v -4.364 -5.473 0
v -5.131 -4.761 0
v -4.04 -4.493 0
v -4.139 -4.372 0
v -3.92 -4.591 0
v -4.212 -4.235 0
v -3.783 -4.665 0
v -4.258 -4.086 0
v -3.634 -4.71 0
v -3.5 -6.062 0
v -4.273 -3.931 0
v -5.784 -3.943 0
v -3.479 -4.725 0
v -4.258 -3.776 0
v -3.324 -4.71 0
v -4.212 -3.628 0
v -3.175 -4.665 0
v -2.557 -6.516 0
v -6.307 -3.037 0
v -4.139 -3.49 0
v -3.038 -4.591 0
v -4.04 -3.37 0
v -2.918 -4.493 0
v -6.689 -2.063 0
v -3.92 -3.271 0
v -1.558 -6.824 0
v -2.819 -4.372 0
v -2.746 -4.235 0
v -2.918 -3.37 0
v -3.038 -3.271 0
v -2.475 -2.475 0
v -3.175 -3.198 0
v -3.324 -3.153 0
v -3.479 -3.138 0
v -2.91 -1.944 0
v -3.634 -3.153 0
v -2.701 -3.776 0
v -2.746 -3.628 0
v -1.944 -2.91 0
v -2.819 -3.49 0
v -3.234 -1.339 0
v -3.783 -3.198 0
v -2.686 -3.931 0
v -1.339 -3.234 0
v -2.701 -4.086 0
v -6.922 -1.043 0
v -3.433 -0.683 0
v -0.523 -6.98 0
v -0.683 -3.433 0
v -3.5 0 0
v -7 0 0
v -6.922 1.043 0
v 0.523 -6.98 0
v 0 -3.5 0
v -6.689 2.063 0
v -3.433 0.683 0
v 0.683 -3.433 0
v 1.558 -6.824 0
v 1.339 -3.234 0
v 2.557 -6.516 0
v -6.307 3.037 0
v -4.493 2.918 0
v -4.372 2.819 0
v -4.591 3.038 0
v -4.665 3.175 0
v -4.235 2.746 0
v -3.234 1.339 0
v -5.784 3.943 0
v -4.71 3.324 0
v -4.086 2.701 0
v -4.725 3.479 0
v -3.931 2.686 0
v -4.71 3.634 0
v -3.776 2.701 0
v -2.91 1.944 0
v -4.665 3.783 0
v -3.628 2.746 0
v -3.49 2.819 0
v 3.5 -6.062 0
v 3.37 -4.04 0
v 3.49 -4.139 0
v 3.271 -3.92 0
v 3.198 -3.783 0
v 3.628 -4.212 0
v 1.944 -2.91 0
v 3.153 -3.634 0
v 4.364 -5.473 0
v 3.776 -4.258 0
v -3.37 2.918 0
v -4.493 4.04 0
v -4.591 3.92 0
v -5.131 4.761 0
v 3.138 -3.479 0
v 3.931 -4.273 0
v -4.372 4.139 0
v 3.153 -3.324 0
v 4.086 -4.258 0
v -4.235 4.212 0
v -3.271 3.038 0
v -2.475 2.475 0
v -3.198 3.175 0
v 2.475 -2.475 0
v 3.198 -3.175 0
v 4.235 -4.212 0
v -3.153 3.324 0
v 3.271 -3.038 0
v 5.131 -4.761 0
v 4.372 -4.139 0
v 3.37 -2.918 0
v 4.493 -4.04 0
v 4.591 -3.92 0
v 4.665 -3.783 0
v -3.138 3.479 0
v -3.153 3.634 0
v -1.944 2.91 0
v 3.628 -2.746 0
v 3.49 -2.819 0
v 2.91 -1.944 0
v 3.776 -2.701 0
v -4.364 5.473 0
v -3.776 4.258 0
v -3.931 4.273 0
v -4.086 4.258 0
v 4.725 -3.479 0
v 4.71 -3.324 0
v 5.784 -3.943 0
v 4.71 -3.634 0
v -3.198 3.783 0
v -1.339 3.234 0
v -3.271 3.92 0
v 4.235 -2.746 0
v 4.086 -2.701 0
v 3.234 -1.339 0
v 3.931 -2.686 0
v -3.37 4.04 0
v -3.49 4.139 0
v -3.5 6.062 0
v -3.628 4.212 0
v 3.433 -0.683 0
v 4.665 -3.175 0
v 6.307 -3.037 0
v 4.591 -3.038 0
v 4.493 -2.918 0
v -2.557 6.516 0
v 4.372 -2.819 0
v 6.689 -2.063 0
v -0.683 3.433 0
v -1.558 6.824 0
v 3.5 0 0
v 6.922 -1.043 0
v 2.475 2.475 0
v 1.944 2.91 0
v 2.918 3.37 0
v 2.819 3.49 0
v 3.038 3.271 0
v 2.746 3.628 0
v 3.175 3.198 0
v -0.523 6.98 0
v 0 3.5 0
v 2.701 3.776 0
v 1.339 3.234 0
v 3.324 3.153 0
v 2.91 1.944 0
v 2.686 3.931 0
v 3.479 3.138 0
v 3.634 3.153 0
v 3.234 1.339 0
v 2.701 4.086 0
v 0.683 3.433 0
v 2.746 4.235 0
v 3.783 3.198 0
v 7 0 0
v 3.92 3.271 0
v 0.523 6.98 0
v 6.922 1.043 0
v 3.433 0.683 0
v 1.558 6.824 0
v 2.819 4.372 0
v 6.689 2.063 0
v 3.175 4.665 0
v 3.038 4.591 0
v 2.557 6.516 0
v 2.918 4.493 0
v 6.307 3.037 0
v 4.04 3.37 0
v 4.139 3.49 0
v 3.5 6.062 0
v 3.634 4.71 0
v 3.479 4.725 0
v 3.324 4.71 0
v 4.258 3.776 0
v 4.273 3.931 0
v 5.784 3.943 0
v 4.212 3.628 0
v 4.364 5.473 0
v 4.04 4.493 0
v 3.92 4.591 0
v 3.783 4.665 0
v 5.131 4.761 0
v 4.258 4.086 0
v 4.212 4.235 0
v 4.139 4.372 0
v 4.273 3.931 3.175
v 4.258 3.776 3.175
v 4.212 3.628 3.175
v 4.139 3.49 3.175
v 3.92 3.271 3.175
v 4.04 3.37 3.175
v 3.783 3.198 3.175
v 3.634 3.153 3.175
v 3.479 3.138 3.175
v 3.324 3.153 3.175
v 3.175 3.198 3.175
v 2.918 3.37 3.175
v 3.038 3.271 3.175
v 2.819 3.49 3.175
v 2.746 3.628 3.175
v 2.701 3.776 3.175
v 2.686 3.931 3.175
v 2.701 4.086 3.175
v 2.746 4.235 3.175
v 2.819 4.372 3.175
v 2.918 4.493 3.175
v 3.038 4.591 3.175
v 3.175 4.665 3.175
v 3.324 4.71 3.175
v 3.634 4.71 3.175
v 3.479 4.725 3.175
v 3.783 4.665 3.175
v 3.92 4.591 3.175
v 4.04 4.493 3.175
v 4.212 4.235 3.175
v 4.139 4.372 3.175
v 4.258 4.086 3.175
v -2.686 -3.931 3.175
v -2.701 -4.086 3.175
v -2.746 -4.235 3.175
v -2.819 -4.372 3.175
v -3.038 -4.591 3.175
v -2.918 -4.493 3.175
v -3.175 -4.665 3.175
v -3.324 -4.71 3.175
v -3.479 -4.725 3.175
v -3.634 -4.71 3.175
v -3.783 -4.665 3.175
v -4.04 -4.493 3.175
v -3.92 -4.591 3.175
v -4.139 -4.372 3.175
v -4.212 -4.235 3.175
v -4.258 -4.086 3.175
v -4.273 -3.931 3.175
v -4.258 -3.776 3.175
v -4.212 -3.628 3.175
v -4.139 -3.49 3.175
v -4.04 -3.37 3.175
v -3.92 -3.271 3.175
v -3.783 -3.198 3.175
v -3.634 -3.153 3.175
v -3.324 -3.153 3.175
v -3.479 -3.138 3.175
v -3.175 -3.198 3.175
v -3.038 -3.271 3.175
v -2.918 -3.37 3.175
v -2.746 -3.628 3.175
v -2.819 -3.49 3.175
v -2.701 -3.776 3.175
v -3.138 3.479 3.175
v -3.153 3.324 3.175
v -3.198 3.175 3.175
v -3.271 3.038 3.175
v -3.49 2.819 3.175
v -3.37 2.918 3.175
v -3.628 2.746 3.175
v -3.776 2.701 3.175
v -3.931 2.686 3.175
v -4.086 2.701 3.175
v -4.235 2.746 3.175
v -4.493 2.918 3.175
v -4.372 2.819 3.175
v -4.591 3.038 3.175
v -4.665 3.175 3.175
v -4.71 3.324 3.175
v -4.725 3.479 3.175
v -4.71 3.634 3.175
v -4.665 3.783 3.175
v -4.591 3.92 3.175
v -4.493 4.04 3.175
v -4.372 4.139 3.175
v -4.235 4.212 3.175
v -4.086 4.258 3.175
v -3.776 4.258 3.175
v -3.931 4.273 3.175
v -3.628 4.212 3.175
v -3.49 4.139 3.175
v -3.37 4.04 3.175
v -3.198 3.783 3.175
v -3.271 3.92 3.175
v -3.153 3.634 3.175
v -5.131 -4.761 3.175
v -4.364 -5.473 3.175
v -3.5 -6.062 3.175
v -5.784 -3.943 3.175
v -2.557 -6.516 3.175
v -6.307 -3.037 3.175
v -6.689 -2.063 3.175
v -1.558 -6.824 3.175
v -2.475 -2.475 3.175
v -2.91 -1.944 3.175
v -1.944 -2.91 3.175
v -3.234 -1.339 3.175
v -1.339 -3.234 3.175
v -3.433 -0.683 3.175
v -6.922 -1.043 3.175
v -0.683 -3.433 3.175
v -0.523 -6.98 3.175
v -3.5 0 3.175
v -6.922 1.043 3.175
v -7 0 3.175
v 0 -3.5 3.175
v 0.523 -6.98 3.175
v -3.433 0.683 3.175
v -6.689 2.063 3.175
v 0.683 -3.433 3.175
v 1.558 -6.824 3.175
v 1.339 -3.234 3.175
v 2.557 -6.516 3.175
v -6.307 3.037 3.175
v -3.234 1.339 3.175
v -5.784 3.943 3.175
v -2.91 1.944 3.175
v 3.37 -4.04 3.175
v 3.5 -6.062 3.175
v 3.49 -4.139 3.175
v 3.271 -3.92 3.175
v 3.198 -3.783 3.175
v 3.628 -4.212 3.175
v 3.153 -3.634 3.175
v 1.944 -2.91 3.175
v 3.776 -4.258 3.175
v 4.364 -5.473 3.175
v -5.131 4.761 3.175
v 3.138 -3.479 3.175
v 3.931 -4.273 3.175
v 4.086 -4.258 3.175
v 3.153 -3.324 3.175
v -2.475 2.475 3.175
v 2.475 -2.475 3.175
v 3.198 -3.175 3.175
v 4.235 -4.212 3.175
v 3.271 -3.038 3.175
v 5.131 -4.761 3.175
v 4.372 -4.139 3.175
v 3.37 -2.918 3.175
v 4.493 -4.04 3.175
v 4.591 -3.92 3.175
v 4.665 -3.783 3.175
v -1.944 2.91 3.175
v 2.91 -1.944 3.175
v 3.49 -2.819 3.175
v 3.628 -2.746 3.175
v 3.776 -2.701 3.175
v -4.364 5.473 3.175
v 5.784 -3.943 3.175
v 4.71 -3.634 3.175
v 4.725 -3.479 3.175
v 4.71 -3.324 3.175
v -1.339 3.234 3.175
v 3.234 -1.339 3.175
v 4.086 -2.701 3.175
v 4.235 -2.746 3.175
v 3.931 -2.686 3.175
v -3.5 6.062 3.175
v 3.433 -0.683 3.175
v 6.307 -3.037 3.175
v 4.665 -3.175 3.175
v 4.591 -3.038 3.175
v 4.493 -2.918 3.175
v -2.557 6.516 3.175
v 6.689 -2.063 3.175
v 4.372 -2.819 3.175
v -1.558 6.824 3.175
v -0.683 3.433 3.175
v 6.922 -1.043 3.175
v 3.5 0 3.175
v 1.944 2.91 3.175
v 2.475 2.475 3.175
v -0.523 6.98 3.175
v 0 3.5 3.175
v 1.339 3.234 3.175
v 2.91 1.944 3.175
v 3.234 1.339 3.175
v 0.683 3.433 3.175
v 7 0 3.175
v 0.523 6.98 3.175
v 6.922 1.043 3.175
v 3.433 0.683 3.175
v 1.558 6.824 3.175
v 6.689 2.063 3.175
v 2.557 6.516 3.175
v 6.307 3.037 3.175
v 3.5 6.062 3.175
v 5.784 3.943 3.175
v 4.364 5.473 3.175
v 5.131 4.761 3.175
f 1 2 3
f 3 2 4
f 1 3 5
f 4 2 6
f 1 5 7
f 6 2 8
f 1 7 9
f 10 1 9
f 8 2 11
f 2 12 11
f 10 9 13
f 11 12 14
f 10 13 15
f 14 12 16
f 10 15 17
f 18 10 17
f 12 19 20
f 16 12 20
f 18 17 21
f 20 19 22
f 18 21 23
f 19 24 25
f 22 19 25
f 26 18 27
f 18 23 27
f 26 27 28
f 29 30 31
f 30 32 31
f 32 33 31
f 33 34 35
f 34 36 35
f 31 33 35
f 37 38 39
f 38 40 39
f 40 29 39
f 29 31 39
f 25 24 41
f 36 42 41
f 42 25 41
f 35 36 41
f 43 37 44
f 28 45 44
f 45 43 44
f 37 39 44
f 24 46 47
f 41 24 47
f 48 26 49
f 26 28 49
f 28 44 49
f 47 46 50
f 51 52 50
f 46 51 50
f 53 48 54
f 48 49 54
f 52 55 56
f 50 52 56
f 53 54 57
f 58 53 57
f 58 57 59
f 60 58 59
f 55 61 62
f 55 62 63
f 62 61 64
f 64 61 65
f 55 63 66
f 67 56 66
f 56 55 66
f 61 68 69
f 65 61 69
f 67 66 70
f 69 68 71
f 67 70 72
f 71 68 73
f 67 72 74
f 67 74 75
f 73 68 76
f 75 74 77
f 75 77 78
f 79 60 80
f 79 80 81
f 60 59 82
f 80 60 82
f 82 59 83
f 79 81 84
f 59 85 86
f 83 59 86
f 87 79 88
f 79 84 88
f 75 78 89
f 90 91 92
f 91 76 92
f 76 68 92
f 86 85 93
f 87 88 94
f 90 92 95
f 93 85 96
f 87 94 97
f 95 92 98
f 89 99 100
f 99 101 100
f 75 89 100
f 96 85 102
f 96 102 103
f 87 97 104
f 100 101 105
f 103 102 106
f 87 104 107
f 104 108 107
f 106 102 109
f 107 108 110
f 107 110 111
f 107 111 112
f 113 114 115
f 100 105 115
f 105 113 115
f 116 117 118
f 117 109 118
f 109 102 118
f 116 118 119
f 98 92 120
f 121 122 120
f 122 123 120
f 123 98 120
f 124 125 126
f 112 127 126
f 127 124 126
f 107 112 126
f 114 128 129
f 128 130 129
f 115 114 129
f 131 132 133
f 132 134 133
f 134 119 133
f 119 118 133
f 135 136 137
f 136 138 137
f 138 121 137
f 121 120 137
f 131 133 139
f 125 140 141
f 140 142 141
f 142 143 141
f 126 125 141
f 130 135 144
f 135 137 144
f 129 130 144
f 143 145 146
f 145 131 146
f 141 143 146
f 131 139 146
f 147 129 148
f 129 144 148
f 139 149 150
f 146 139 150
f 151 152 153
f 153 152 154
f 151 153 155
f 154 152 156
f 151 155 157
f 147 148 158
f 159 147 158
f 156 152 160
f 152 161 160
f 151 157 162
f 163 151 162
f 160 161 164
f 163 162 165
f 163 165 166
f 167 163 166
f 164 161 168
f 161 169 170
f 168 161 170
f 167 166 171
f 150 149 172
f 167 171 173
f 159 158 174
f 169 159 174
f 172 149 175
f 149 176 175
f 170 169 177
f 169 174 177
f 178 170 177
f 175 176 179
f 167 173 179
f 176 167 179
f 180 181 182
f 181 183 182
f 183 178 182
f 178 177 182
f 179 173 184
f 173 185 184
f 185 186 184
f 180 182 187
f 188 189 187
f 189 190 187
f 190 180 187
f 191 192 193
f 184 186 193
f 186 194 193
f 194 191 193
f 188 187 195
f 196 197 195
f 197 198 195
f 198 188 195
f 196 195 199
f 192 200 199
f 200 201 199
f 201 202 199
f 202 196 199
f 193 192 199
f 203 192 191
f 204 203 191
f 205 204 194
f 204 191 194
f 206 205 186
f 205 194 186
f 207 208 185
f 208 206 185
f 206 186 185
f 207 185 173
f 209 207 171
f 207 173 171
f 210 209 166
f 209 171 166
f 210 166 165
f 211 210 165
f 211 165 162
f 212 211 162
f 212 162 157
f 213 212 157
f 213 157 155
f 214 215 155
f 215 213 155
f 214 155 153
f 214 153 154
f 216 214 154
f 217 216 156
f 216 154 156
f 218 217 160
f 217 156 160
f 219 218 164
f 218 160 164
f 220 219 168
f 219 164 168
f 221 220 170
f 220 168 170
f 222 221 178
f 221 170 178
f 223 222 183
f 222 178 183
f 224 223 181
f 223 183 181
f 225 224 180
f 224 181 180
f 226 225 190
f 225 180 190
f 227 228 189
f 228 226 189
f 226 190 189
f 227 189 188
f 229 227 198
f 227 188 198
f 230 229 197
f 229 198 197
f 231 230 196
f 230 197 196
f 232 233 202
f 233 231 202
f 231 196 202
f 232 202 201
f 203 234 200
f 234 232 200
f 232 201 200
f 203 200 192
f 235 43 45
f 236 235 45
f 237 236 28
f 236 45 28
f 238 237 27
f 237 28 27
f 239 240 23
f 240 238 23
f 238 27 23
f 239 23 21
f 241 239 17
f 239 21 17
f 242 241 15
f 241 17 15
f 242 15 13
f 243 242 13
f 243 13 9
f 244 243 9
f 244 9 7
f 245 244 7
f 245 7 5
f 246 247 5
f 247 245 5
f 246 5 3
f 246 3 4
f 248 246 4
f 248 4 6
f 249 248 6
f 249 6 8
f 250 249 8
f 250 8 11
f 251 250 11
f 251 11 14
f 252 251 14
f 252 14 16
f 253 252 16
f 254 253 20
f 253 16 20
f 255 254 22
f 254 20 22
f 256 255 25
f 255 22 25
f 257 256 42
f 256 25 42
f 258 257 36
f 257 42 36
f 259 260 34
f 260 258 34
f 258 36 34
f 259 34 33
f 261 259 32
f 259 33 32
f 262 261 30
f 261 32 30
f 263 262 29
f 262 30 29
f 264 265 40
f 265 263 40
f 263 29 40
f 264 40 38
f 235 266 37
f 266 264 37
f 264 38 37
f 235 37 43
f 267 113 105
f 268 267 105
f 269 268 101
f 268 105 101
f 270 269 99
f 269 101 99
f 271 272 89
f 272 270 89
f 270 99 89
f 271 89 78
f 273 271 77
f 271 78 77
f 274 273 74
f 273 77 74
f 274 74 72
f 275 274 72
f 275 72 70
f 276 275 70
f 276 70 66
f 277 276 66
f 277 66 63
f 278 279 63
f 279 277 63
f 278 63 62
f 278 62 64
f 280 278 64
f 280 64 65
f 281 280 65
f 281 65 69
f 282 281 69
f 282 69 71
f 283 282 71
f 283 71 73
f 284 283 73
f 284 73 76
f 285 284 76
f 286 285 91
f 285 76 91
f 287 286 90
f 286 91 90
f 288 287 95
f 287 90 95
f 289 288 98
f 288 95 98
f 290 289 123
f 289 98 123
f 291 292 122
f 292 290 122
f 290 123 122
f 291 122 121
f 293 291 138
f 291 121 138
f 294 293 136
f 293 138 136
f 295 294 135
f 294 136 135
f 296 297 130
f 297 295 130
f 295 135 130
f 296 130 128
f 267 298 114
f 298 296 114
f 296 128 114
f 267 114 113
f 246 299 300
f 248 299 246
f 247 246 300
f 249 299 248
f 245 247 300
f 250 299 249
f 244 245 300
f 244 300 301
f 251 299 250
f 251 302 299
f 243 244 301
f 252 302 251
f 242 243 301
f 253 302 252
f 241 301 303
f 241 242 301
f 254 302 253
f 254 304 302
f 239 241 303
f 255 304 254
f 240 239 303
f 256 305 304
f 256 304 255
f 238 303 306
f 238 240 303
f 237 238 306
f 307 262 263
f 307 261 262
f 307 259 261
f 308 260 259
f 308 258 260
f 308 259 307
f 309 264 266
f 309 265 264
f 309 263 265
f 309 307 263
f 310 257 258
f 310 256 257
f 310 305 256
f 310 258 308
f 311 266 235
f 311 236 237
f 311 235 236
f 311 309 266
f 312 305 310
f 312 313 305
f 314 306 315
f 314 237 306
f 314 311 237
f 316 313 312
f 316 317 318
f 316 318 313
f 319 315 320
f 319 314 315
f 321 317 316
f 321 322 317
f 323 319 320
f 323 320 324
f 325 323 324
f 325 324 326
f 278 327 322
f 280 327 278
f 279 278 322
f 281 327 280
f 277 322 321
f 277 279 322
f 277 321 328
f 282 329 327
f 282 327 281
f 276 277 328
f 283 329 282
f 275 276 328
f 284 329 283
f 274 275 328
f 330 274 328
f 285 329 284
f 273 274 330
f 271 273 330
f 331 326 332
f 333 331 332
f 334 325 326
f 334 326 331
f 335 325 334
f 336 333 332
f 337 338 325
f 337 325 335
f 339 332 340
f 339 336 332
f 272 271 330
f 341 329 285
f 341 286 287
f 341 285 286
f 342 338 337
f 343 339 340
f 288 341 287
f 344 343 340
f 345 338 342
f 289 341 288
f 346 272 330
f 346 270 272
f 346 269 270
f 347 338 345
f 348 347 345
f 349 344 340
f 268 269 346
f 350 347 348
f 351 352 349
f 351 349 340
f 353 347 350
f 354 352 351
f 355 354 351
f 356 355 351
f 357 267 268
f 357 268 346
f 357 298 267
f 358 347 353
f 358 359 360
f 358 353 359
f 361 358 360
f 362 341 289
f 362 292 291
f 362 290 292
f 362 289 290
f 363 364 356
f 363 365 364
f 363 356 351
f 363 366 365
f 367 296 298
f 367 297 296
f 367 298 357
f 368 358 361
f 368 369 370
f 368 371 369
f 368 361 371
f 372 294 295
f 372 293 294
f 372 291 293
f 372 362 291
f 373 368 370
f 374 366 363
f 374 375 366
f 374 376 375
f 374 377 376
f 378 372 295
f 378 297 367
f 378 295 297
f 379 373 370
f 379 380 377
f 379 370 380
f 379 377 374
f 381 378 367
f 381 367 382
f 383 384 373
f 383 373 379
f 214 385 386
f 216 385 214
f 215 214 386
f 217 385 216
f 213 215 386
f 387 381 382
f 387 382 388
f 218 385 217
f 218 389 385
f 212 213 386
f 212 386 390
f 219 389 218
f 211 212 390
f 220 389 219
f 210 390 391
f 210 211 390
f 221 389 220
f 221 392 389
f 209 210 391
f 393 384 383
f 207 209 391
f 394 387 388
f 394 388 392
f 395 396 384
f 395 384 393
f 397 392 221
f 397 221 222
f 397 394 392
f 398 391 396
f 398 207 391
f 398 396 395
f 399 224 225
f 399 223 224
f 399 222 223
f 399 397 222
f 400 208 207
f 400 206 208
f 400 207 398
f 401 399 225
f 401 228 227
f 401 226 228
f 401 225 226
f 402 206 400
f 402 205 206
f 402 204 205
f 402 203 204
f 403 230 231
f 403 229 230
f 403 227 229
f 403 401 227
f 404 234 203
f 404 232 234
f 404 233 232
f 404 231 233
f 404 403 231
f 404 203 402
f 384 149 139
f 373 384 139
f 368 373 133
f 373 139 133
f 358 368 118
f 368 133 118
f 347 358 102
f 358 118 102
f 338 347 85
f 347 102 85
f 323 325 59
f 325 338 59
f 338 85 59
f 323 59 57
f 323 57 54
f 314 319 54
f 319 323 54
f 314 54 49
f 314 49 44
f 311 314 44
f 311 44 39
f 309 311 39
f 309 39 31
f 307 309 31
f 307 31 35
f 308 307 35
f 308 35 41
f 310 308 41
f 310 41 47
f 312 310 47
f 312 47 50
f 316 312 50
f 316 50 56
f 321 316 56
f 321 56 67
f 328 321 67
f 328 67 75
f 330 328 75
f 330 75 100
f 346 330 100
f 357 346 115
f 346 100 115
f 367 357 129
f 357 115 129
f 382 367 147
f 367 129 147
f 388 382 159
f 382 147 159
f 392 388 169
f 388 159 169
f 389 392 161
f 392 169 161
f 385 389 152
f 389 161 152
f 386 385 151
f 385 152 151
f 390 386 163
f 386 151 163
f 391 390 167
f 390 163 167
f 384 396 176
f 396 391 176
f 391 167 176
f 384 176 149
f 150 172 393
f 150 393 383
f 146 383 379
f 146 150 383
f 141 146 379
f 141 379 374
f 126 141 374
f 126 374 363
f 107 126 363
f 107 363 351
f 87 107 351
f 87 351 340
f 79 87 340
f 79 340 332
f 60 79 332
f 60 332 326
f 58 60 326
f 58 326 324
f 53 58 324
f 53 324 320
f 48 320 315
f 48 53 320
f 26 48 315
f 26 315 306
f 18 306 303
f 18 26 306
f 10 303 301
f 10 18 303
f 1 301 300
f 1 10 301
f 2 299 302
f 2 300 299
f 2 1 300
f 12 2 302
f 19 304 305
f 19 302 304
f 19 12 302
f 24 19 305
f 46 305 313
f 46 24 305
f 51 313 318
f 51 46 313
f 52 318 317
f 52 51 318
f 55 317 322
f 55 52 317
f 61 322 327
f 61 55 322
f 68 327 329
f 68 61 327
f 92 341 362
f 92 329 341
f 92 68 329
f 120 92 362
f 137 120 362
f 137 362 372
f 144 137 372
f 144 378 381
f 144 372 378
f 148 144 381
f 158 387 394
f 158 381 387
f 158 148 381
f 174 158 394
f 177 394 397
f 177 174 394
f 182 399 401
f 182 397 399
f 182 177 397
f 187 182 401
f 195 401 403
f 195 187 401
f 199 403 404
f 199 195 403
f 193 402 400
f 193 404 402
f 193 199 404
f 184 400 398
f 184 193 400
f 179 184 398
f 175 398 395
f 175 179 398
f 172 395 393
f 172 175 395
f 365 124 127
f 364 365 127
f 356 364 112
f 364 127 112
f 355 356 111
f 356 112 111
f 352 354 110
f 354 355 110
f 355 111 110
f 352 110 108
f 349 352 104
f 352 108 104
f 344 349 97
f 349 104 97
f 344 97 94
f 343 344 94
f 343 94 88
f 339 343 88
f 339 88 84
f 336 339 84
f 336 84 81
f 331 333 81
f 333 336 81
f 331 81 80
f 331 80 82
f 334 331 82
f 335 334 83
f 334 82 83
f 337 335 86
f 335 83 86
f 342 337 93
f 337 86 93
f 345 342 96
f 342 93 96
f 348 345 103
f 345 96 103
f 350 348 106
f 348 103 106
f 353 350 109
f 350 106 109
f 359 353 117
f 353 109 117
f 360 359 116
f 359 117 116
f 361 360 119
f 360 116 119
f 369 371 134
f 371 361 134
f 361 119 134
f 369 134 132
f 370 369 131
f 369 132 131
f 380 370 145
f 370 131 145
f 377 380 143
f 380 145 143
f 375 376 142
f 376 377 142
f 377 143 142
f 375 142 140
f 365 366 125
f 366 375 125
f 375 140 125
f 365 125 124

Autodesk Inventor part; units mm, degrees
ref_plane "YZ Plane" through (0, 0, 0) normal (1, 0, 0) x (0, 1, 0)
ref_plane "XZ Plane" through (0, 0, 0) normal (0, 1, 0) x (-1, 0, 0)
ref_plane "XY Plane" through (0, 0, 0) normal (0, 0, 1) x (1, 0, 0)
sketch "Sketch1" plane through (0, 0, 0) normal (0, 0, 1) x (1, 0, 0)
  circle A0 centre (0, 0) radius 3.5
  circle A1 centre (0, 0) radius 7
  circle A2 centre (3.9313, -3.4792) radius 0.7937
  circle A3 centre (3.4792, 3.9313) radius 0.7937
  circle A4 centre (-3.9313, 3.4792) radius 0.7937
  circle A5 centre (-3.4792, -3.9313) radius 0.7937
  dimension "d0" = 7
  dimension "d1" = 14
  dimension "d2" = 1.5875
  dimension "d3" = 0.956
  dimension "d6" = 360
  dimension "d10" = 0.956
  dimension "d11" = 0.956
  dimension "d12" = 0.956
  dimension "d13" = 5.8368
  dimension "d14" = 5.8368
  dimension "d15" = 5.8368
extrude "Extrusion1" add sketch "Sketch1" along normal blind 3.175
properties part number "gear ring"
